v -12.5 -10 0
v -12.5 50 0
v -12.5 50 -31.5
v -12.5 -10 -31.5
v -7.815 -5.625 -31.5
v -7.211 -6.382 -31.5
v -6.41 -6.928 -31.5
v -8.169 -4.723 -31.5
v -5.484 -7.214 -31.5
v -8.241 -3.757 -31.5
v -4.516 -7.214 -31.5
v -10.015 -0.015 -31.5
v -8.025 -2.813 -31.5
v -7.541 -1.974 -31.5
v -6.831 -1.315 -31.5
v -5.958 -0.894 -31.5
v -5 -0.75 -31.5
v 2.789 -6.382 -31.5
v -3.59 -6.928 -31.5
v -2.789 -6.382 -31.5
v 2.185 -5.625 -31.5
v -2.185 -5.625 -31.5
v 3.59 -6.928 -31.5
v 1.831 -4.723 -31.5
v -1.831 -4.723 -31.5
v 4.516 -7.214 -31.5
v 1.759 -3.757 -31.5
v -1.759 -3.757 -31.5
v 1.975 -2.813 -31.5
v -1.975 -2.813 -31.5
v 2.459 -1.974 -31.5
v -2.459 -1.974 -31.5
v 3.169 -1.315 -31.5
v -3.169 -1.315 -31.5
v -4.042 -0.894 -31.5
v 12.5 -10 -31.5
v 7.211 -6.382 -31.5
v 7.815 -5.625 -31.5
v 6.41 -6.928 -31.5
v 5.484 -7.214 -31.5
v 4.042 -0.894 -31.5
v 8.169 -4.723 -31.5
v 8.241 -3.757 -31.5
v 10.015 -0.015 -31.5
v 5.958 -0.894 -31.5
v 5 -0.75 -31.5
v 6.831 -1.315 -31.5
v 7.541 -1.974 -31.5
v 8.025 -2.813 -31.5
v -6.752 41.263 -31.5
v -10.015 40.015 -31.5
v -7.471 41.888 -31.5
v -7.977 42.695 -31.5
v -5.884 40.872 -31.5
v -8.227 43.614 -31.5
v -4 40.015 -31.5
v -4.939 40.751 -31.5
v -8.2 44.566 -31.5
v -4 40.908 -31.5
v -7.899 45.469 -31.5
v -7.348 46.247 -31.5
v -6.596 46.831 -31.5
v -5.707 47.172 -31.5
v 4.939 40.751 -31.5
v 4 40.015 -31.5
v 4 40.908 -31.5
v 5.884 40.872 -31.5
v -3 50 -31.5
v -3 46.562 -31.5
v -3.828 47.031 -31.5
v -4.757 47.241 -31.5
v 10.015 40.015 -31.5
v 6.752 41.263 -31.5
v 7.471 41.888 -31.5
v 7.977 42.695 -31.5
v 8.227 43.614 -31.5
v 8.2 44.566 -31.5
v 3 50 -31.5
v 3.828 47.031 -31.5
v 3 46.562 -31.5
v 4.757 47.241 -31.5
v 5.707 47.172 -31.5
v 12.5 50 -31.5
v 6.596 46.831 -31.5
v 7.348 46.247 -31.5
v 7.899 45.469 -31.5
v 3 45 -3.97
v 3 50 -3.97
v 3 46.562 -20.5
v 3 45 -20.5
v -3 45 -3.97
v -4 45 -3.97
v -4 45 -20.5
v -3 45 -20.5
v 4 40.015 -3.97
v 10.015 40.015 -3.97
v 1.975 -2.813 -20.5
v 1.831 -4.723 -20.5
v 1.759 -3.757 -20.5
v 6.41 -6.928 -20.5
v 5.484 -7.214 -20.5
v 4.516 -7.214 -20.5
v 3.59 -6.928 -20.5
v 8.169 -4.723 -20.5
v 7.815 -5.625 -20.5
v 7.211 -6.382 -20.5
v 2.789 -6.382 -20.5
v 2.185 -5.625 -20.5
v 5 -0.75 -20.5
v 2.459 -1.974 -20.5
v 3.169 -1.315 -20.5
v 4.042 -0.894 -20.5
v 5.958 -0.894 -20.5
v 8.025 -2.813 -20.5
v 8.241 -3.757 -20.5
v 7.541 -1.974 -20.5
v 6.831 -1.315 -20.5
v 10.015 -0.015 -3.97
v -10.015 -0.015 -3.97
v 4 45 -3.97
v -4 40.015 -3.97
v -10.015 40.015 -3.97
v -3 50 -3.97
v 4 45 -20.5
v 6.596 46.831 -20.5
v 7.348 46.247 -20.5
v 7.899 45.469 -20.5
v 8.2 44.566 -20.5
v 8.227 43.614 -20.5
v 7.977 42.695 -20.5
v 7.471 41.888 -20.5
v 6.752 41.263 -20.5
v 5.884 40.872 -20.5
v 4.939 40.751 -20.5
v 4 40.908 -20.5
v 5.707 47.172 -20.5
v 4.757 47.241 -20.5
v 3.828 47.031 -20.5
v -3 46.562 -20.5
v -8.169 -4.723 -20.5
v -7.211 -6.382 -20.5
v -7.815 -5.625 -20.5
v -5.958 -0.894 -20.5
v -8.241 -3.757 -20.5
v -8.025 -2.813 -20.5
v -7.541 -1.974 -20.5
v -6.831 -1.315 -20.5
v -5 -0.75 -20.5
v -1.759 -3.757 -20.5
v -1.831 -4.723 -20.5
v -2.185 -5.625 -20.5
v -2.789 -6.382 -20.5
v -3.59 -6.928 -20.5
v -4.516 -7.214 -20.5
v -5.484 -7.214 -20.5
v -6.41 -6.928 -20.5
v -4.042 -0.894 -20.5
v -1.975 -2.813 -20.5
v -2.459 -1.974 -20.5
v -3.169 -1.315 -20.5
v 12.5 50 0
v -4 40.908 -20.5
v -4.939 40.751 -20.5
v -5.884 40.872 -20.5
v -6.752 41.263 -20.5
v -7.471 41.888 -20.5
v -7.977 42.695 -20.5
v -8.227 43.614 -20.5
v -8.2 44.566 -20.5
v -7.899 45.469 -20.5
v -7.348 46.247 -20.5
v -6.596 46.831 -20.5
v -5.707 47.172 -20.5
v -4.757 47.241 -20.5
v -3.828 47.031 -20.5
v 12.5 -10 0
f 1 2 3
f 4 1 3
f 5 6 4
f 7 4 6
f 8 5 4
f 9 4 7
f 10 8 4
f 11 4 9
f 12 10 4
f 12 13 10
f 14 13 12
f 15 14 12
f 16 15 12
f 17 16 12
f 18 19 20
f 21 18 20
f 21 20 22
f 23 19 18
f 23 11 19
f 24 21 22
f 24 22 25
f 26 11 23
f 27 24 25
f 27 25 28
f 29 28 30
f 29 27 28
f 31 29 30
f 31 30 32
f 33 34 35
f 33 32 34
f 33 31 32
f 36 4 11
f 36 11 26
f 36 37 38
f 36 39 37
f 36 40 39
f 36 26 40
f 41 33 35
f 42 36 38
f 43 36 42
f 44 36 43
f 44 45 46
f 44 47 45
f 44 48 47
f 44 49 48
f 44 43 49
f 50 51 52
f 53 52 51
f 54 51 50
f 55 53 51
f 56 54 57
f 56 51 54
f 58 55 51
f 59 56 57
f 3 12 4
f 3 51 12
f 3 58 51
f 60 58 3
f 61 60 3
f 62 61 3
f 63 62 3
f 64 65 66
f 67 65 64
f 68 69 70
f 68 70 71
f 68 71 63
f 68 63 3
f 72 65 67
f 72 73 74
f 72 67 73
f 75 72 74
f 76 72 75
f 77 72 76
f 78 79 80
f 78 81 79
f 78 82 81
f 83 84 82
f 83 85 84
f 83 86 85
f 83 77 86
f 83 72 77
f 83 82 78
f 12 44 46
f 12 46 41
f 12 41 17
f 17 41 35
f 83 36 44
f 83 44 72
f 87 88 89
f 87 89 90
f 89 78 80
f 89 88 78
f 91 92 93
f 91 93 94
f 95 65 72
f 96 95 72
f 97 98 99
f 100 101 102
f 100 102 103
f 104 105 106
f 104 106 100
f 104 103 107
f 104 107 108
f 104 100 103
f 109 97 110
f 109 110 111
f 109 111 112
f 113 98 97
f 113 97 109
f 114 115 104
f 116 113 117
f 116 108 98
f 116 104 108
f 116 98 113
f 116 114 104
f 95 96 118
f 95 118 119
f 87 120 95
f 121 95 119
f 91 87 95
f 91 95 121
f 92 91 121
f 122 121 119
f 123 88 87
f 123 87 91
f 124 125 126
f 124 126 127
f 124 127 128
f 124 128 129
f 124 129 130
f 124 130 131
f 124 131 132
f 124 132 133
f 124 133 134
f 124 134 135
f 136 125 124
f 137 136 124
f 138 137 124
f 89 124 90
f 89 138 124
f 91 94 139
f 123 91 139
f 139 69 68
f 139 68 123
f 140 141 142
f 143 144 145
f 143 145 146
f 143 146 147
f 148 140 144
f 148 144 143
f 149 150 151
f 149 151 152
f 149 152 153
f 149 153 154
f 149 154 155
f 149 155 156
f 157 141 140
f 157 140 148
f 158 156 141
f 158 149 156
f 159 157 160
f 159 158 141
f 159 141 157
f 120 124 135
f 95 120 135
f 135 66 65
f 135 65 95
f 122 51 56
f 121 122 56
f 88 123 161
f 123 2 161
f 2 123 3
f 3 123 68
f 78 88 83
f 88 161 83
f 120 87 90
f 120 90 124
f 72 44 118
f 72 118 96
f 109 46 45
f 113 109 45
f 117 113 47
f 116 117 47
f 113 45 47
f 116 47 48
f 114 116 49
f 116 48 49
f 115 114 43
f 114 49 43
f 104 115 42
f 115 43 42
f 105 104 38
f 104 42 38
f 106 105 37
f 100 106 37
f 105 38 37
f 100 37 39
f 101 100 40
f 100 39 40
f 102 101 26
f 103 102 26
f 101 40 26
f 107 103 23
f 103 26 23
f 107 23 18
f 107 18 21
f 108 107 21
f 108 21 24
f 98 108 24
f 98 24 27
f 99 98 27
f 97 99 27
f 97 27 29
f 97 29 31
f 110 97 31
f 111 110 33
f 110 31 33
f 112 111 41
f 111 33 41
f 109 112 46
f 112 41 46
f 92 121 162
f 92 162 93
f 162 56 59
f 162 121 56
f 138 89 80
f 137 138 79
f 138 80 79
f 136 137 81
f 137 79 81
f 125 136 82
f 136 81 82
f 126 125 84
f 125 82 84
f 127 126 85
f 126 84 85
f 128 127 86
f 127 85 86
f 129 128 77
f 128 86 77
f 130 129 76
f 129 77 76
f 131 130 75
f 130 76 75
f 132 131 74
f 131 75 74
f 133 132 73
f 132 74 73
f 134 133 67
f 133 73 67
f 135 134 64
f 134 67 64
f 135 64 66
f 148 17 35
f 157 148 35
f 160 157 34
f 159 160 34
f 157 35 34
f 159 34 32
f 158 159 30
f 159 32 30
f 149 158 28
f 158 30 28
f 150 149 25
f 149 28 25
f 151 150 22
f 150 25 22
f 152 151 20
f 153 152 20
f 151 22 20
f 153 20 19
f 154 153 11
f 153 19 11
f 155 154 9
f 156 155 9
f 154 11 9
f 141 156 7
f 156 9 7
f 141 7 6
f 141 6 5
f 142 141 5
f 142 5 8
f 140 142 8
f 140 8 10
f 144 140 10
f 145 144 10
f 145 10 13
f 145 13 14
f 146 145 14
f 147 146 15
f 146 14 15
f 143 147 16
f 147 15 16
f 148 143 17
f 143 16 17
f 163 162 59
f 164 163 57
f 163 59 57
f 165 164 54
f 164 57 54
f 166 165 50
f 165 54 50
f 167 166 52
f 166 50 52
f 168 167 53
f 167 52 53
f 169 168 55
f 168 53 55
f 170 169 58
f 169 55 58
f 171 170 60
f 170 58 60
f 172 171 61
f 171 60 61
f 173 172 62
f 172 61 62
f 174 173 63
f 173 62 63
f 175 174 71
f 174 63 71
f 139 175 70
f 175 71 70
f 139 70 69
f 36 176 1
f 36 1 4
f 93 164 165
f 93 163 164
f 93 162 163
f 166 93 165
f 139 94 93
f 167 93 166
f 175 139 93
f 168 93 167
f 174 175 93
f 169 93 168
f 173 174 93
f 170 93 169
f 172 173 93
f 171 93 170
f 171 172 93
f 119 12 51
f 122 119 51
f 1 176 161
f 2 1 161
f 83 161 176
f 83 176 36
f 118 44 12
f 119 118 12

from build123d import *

# Parameters (mm, degrees)
SKETCH1_W           = 31.5
SKETCH1_H           = 60
BOSS_EXTRUDE1_DEPTH = 12.5
CUT_EXTRUDE1_DEPTH  = 27.53
SKETCH6_R           = 3.25
CUT_EXTRUDE2_DEPTH  = 11


with BuildPart() as part:
    # Sketch1 → Boss-Extrude1 (new, symmetric)
    with BuildSketch(Plane(origin=(0, 0, 0), x_dir=(0, 0, -1), z_dir=(1, 0, 0))):
        with Locations((15.75, 20)):
            Rectangle(SKETCH1_W, SKETCH1_H)
    extrude(amount=BOSS_EXTRUDE1_DEPTH, both=True)

    # Sketch2 → Cut-Extrude1 (cut)
    with BuildSketch(Plane(origin=(0, 0, -31.5), x_dir=(-1, 0, 0), z_dir=(0, 0, -1))):
        Polygon((10.015, -0.015), (10.015, 40.015), (4, 40.015), (4, 45), (3, 45), (3, 50), (-3, 50), (-3, 45), (-4, 45), (-4, 40.015), (-10.015, 40.015), (-10.015, -0.015), align=None)
    extrude(amount=-CUT_EXTRUDE1_DEPTH, mode=Mode.SUBTRACT)

    # Sketch6 → Cut-Extrude2 (cut)
    with BuildSketch(Plane(origin=(0, 0, -31.5), x_dir=(-1, 0, 0), z_dir=(0, 0, -1))):
        with Locations((-5, 44)):
            Circle(SKETCH6_R)
        with Locations((5, 44)):
            Circle(SKETCH6_R)
        with Locations((5, -4)):
            Circle(SKETCH6_R)
        with Locations((-5, -4)):
            Circle(SKETCH6_R)
    extrude(amount=-CUT_EXTRUDE2_DEPTH, mode=Mode.SUBTRACT)


solid = part.part
